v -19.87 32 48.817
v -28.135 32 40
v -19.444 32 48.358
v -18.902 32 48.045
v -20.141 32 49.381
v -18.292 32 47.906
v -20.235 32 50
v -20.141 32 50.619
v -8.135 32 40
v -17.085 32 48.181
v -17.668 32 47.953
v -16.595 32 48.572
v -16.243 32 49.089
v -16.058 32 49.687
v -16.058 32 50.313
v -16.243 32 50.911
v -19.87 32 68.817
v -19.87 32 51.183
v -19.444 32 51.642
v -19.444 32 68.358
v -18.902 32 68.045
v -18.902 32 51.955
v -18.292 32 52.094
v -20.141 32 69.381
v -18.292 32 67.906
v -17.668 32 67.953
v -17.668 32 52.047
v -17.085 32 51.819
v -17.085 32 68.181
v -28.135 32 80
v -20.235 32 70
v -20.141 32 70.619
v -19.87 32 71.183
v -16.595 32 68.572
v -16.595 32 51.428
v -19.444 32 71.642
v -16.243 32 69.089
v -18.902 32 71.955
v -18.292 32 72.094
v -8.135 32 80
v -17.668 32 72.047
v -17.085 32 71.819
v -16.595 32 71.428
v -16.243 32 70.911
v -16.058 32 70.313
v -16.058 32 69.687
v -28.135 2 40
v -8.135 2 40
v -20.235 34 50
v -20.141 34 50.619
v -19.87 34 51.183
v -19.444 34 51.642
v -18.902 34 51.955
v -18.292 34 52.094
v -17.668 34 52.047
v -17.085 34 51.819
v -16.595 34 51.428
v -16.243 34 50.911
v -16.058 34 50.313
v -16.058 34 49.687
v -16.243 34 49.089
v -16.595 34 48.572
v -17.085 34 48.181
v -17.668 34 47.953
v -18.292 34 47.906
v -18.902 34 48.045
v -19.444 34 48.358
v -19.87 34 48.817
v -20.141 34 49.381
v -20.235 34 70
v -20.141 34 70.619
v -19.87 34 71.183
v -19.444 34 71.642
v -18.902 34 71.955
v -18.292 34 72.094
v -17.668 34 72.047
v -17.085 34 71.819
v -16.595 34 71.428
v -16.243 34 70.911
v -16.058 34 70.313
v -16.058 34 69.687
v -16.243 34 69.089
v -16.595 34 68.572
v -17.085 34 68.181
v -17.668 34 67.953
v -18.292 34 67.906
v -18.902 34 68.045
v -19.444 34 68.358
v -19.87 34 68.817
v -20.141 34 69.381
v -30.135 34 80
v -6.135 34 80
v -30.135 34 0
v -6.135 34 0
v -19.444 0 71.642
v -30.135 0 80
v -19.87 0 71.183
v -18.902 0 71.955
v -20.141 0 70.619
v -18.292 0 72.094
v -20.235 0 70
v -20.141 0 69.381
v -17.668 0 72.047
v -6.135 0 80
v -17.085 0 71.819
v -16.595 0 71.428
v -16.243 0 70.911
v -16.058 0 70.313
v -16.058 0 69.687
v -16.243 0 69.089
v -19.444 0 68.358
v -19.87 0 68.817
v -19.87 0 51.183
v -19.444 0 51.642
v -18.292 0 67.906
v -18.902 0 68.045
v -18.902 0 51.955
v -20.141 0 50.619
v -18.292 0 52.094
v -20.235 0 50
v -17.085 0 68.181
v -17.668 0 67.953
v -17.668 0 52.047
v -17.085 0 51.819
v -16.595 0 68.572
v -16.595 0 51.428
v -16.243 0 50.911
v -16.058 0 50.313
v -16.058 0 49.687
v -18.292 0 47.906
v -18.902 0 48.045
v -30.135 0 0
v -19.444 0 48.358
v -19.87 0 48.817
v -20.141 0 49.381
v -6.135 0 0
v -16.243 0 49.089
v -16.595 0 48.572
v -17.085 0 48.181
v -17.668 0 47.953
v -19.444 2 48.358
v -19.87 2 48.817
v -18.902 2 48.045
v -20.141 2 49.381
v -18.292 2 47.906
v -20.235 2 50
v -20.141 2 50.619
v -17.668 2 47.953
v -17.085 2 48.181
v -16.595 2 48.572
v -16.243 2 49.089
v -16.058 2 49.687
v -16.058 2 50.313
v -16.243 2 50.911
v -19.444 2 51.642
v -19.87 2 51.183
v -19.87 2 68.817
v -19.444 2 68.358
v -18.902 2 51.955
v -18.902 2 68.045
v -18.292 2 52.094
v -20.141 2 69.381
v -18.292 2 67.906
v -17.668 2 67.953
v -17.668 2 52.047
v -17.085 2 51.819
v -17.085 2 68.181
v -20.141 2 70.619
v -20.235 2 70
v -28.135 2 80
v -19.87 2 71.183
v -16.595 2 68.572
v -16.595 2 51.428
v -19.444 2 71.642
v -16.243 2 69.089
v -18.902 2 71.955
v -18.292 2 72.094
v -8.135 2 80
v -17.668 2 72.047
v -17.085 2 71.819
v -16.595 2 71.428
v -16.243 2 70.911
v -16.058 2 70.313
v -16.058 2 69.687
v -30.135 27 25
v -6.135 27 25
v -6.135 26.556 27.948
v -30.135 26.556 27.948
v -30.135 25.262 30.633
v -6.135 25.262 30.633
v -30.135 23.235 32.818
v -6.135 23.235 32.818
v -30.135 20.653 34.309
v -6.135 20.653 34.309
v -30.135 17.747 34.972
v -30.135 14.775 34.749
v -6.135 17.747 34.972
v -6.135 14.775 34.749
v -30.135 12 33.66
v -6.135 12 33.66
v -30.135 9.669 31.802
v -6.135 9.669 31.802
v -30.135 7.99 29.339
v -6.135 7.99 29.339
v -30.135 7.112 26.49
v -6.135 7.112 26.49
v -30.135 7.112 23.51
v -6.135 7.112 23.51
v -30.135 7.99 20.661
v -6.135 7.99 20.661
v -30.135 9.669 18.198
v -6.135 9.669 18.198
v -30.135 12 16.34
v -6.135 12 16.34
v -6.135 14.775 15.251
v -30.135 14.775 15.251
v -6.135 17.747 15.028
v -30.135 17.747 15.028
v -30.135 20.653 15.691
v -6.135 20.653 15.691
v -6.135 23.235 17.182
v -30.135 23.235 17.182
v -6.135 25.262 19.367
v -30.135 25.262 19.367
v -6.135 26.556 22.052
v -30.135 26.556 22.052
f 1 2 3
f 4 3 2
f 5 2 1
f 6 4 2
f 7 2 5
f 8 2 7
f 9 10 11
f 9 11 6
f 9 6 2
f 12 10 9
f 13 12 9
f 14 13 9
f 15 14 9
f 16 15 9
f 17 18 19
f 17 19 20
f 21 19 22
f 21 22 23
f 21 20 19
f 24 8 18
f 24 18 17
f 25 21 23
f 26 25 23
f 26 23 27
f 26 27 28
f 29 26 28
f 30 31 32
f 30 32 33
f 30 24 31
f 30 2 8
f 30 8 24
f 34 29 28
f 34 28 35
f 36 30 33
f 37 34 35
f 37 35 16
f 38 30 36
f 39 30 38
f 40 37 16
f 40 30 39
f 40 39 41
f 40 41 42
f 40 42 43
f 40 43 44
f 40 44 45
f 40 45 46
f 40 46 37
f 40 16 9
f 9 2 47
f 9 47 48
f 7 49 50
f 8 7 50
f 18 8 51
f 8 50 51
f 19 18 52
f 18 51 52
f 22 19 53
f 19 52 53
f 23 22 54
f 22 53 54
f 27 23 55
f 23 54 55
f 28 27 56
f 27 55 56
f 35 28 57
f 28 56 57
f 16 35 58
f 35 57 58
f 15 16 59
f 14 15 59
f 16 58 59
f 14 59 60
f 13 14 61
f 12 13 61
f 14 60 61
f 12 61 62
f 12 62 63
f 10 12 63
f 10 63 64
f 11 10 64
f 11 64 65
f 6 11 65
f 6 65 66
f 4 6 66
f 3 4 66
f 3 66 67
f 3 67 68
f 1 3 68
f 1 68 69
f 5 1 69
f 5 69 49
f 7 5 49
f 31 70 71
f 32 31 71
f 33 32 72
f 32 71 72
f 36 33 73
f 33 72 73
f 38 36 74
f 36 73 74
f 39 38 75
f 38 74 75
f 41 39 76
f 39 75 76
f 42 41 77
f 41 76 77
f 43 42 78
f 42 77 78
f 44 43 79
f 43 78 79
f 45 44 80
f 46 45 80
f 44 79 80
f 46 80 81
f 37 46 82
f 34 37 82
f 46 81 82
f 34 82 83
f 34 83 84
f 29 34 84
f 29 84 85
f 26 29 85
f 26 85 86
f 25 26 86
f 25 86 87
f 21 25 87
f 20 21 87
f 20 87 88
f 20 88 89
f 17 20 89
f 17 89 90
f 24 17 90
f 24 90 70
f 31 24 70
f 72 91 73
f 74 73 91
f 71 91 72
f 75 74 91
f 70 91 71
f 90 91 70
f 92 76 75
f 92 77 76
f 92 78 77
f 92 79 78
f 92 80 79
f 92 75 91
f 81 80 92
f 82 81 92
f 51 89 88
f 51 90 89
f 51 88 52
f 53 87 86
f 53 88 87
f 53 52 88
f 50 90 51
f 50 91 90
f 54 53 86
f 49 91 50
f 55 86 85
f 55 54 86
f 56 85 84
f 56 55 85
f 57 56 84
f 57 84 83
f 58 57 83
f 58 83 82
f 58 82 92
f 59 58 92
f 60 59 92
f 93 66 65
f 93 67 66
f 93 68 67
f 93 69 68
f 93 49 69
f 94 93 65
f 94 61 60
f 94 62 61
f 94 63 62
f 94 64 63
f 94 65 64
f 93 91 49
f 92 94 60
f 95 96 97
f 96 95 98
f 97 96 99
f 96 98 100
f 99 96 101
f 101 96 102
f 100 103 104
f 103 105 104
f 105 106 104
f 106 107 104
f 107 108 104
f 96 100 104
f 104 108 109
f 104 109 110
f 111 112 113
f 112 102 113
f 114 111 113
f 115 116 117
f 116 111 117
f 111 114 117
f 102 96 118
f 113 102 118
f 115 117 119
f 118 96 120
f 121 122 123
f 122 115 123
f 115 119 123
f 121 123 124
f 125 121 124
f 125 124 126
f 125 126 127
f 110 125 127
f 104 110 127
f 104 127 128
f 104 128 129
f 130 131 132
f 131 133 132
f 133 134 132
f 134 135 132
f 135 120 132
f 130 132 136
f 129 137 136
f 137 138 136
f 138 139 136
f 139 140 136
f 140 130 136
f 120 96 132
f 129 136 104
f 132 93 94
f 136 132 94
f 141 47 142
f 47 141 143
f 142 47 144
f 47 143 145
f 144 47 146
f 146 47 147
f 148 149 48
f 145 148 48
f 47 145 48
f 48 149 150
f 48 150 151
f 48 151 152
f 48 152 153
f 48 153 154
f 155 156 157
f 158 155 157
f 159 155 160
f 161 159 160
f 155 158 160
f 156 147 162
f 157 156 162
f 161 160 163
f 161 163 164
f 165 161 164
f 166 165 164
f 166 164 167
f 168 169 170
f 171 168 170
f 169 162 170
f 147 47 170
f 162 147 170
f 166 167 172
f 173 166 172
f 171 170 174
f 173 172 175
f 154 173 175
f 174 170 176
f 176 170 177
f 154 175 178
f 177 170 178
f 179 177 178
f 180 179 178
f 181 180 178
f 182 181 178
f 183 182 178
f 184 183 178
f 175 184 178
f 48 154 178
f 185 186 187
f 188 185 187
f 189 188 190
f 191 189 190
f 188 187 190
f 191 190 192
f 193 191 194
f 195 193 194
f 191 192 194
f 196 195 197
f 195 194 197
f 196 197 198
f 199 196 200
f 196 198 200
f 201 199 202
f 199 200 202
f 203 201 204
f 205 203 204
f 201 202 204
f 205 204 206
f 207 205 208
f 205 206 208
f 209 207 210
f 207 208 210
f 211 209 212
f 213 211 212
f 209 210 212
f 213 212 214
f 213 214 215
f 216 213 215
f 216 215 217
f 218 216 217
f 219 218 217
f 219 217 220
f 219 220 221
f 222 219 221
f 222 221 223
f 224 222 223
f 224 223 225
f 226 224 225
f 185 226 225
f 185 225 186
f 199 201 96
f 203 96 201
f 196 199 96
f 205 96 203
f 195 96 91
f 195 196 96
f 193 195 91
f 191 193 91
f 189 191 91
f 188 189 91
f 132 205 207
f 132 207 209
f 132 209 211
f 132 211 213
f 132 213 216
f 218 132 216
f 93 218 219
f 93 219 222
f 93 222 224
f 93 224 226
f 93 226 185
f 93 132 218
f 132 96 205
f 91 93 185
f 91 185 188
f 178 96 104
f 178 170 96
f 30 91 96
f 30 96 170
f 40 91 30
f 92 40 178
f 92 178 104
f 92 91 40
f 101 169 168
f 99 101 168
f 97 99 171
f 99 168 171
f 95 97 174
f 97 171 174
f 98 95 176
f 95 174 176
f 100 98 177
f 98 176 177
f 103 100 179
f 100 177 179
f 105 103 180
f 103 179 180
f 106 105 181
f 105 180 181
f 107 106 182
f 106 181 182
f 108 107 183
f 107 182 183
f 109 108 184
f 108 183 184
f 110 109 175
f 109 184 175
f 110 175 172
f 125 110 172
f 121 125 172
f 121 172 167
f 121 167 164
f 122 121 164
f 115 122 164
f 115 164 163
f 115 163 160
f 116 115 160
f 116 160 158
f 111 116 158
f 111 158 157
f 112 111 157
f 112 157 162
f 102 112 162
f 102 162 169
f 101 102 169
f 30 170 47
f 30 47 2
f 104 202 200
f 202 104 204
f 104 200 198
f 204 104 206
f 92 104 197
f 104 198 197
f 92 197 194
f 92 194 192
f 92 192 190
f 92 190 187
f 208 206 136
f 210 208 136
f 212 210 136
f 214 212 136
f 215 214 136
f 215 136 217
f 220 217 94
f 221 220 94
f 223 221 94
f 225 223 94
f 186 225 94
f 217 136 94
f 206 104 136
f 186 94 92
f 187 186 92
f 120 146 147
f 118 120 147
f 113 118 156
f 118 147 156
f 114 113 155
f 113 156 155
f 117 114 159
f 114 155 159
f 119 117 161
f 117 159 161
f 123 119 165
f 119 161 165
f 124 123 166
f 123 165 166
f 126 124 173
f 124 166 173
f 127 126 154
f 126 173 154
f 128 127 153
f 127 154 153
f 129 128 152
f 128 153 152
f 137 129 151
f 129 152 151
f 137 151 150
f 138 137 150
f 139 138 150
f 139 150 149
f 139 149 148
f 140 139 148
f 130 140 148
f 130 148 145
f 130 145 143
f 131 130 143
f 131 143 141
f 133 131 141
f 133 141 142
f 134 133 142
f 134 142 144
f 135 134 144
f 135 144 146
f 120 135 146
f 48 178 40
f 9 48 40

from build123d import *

# Parameters (mm, degrees)
F0_W     = 24
F0_H     = 34
F1_DEPTH = 80
F2_R     = 10
F3_DEPTH = 25
F4_W     = 20
F4_H     = 30
F5_DEPTH = 40
F6_R     = 2.1
F7_DEPTH = 40


with BuildPart() as f1:
    # F0 (on Top) → F1 (new body)
    with BuildSketch(Plane.XY):
        with Locations((-18.134795, 17)):
            Rectangle(F0_W, F0_H)
    extrude(amount=F1_DEPTH)

    # F2 (on face) → F3 (cut)
    with BuildSketch(Plane.YZ.offset(-6.134795)):
        with Locations((17, 25)):
            Circle(F2_R)
    extrude(amount=-F3_DEPTH, mode=Mode.SUBTRACT)

    # F4 (on face) → F5 (cut)
    with BuildSketch(Plane.XY.offset(80)):
        with Locations((-18.134795, 17)):
            Rectangle(F4_W, F4_H)
    extrude(amount=-F5_DEPTH, mode=Mode.SUBTRACT)

    # F6 (on face) → F7 (cut)
    with BuildSketch(Plane(origin=(0, 34, 0), x_dir=(-1, 0, 0), z_dir=(0, 1, 0))):
        with Locations((18.134795, 70)):
            Circle(F6_R)
        with Locations((18.134795, 50)):
            Circle(F6_R)
    extrude(amount=-F7_DEPTH, mode=Mode.SUBTRACT)


solid = f1.part
